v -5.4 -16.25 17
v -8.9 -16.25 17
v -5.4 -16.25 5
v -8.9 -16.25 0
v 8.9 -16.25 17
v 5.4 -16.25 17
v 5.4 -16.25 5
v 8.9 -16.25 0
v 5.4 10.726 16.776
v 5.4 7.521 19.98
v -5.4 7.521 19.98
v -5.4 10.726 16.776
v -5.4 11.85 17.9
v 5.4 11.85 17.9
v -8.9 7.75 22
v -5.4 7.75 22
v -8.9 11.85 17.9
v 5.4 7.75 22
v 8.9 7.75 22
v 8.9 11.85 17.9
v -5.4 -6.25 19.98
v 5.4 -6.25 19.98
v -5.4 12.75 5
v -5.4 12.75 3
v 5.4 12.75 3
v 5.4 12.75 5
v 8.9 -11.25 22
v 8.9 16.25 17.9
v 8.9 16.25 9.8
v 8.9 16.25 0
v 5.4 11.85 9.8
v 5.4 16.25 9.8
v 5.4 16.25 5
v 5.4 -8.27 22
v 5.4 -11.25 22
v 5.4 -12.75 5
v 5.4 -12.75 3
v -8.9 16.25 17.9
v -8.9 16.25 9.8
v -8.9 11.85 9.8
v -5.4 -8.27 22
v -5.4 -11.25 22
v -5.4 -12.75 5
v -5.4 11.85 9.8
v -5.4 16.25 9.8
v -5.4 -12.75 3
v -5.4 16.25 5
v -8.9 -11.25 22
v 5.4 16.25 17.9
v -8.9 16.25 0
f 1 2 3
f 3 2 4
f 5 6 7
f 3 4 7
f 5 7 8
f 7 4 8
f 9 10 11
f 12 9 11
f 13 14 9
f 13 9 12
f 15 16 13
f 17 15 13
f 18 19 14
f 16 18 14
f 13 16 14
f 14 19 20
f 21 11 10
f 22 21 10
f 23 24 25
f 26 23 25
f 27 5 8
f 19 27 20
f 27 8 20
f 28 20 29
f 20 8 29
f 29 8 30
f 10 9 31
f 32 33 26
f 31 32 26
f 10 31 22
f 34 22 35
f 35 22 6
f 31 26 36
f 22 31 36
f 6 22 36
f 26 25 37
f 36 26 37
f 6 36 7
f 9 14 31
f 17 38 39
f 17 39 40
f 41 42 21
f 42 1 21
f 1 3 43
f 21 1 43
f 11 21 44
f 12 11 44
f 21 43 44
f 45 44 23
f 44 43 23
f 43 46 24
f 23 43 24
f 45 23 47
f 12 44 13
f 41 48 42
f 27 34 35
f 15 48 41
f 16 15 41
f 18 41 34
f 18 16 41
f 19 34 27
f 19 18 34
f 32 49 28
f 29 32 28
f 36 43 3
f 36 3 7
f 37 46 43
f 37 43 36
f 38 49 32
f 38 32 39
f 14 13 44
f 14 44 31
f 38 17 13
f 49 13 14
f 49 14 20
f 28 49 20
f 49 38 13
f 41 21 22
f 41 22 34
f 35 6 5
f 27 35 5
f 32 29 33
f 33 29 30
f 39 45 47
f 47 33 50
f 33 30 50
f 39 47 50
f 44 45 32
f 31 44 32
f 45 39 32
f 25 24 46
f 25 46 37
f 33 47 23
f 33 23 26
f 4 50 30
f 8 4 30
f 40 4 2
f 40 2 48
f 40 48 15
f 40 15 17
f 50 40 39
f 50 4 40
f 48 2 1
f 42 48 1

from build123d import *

# Parameters (mm, degrees)
F1_DEPTH     = 3
F0_W         = 3.4999997824
F0_H         = 12.75
F2_DEPTH     = 22
F0_W_2       = 10.8
F0_H_2       = 3.4999997824
F3_DEPTH     = 5
F4_SIZE      = 5
F5_DEPTH     = 17.9
F6_T4_DEPTH  = 29.2168296621
F6_T9_DEPTH  = 29.2168296621
F7_W         = 3.4999997824
F7_H         = 4.4000236183
F8_DEPTH     = 8.1
F9_W         = 3.4999997824
F9_H         = 5.7981096033
F9_H_2       = 0.0001660025
F9_W_2       = 14.2999671862
F10_DEPTH    = 1.59
F11_DEPTH    = 5
F13_DEPTH    = 2.02
F14_T4_DEPTH = 36.5168298797


# Not quite as in the source:
# - a fillet or chamfer that OpenCascade refuses, or shapes differently, is made with other operations: its cross-section is extruded or revolved along the edge and cut away or added
# - ends of sketch curves that miss each other by under 0.0002 mm in the source are joined


with BuildPart() as f1:
    # F0 (on Top) → F1 (new body)
    with BuildSketch(Plane.XY):
        Polygon((5.4, 0), (5.4, 12.75), (-5.4, 12.75), (-5.4, 0), (-5.4, -12.75), (5.4, -12.75), align=None)
    extrude(amount=F1_DEPTH)

    # F0 (on Top) → F2 (join)
    with BuildSketch(Plane.XY):
        with Locations((-7.1499998912, 6.375)):
            Rectangle(F0_W, F0_H)
        with Locations((7.1499998912, 6.375)):
            Rectangle(F0_W, F0_H)
        Polygon((-5.4, -12.75), (-5.4, 0), (-8.8999997824, 0), (-8.8999997824, -16.2499997824), (-5.4, -16.2499997824), align=None)
        Polygon((8.8999997824, 0), (5.4, 0), (5.4, -12.75), (5.4, -16.2499997824), (8.8999997824, -16.2499997824), align=None)
    extrude(amount=F2_DEPTH)

    # F0 (on Top) → F3 (join)
    with BuildSketch(Plane.XY):
        with Locations((0, 14.4999998912)):
            Rectangle(F0_W_2, F0_H_2)
        with Locations((-7.1499998912, 14.4999998912)):
            Rectangle(F0_W, F0_H_2)
        with Locations((7.1499998912, 14.4999998912)):
            Rectangle(F0_W, F0_H_2)
    extrude(amount=F3_DEPTH)

    # F4
    f4_edges = [f1.edges().sort_by_distance(p)[0] for p in [
        (-7.15, -16.25, 22),
        (7.15, -16.25, 22),
    ]]
    chamfer(f4_edges, length=F4_SIZE)

    # F0 (on Top) → F5 (join)
    with BuildSketch(Plane.XY):
        with Locations((-7.1499998912, 14.4999998912)):
            Rectangle(F0_W, F0_H_2)
        with Locations((7.1499998912, 14.4999998912)):
            Rectangle(F0_W, F0_H_2)
    extrude(amount=F5_DEPTH)

    # F6: chamfer of 5 on 2 edges, made by hand


with BuildPart() as f6_tool2:
    # F6_s3 → F6_t4 (new body)
    with BuildSketch(Plane.YZ.offset(21.7584147223)):
        Polygon((7.75, 22), (12.75, 17), (12.75, 22), align=None)
    extrude(amount=-F6_T4_DEPTH)

    split(bisect_by=Plane.XY.offset(17.9), keep=Keep.TOP)


with BuildPart() as f1_1:
    add(f1.part)

    # F6_t1: cut F6_tool2
    add(f6_tool2.part, mode=Mode.SUBTRACT)


with BuildPart() as f6_tool7:
    # F6_s8 → F6_t9 (new body)
    with BuildSketch(Plane.YZ.offset(7.4584149398)):
        Polygon((12.75, 17), (7.75, 22), (12.75, 22), align=None)
    extrude(amount=-F6_T9_DEPTH)

    split(bisect_by=Plane.XY.offset(17.9), keep=Keep.TOP)


with BuildPart() as f1_2:
    add(f1_1.part)

    # F6_t6: cut F6_tool7
    add(f6_tool7.part, mode=Mode.SUBTRACT)

    # F7 (on face) → F8 (join)
    with BuildSketch(Plane.XY.offset(17.9)):
        with Locations((7.1499998912, 14.0500118092)):
            Rectangle(F7_W, F7_H)
        Polygon((-8.9000016451, 11.85), (5.4, 11.85), (5.4, 16.2499997824), (-8.9000016451, 16.2500236183), align=None)
    extrude(amount=-F8_DEPTH)

    # F9 (on face) → F10 (join)
    with BuildSketch(Plane(origin=(0, 14.875, 14.875), x_dir=(-1, 0, 0), z_dir=(0, 0.7071067812, 0.7071067812))):
        with Locations((-7.1499998912, 7.1772168303)):
            Rectangle(F9_W, F9_H)
        with Locations((-7.1499998912, 4.2780790274)):
            Rectangle(F9_W, F9_H_2)
        with Locations((1.7499835931, 7.1772168303)):
            Rectangle(F9_W_2, F9_H)
    extrude(amount=-F10_DEPTH)

    # F0 (on Top) → F11 (join)
    with BuildSketch(Plane.XY):
        with Locations((0, -14.4999998912)):
            Rectangle(F0_W_2, F0_H_2)
    extrude(amount=F11_DEPTH)

    # F12 (on face) → F13 (join)
    with BuildSketch(Plane.XY.offset(22)):
        Polygon((5.4, -11.2499997824), (5.4, 7.75), (-8.8998991996, 7.75), (-8.8998991996, -11.2499557436), align=None)
    extrude(amount=-F13_DEPTH)

    # F14: chamfer of 5 on 1 edges, made by hand


with BuildPart() as f14_tool2:
    # F14_s3 → F14_t4 (new body)
    with BuildSketch(Plane(origin=(-18.2583802936, 5.62297e-05, 0), x_dir=(0, 0, 1), z_dir=(1, -3.0797e-06, 0))):
        Polygon((19.98, 6.2499831522), (24.98, 11.2499831522), (19.98, 11.2499831522), align=None)
    extrude(amount=F14_T4_DEPTH)

    split(bisect_by=Plane.YZ.offset(5.4), keep=Keep.BOTTOM)

    split(bisect_by=Plane.YZ.offset(-5.4), keep=Keep.TOP)


with BuildPart() as f1_3:
    add(f1_2.part)

    # F14_t1: cut F14_tool2
    add(f14_tool2.part, mode=Mode.SUBTRACT)


solid = f1_3.part
